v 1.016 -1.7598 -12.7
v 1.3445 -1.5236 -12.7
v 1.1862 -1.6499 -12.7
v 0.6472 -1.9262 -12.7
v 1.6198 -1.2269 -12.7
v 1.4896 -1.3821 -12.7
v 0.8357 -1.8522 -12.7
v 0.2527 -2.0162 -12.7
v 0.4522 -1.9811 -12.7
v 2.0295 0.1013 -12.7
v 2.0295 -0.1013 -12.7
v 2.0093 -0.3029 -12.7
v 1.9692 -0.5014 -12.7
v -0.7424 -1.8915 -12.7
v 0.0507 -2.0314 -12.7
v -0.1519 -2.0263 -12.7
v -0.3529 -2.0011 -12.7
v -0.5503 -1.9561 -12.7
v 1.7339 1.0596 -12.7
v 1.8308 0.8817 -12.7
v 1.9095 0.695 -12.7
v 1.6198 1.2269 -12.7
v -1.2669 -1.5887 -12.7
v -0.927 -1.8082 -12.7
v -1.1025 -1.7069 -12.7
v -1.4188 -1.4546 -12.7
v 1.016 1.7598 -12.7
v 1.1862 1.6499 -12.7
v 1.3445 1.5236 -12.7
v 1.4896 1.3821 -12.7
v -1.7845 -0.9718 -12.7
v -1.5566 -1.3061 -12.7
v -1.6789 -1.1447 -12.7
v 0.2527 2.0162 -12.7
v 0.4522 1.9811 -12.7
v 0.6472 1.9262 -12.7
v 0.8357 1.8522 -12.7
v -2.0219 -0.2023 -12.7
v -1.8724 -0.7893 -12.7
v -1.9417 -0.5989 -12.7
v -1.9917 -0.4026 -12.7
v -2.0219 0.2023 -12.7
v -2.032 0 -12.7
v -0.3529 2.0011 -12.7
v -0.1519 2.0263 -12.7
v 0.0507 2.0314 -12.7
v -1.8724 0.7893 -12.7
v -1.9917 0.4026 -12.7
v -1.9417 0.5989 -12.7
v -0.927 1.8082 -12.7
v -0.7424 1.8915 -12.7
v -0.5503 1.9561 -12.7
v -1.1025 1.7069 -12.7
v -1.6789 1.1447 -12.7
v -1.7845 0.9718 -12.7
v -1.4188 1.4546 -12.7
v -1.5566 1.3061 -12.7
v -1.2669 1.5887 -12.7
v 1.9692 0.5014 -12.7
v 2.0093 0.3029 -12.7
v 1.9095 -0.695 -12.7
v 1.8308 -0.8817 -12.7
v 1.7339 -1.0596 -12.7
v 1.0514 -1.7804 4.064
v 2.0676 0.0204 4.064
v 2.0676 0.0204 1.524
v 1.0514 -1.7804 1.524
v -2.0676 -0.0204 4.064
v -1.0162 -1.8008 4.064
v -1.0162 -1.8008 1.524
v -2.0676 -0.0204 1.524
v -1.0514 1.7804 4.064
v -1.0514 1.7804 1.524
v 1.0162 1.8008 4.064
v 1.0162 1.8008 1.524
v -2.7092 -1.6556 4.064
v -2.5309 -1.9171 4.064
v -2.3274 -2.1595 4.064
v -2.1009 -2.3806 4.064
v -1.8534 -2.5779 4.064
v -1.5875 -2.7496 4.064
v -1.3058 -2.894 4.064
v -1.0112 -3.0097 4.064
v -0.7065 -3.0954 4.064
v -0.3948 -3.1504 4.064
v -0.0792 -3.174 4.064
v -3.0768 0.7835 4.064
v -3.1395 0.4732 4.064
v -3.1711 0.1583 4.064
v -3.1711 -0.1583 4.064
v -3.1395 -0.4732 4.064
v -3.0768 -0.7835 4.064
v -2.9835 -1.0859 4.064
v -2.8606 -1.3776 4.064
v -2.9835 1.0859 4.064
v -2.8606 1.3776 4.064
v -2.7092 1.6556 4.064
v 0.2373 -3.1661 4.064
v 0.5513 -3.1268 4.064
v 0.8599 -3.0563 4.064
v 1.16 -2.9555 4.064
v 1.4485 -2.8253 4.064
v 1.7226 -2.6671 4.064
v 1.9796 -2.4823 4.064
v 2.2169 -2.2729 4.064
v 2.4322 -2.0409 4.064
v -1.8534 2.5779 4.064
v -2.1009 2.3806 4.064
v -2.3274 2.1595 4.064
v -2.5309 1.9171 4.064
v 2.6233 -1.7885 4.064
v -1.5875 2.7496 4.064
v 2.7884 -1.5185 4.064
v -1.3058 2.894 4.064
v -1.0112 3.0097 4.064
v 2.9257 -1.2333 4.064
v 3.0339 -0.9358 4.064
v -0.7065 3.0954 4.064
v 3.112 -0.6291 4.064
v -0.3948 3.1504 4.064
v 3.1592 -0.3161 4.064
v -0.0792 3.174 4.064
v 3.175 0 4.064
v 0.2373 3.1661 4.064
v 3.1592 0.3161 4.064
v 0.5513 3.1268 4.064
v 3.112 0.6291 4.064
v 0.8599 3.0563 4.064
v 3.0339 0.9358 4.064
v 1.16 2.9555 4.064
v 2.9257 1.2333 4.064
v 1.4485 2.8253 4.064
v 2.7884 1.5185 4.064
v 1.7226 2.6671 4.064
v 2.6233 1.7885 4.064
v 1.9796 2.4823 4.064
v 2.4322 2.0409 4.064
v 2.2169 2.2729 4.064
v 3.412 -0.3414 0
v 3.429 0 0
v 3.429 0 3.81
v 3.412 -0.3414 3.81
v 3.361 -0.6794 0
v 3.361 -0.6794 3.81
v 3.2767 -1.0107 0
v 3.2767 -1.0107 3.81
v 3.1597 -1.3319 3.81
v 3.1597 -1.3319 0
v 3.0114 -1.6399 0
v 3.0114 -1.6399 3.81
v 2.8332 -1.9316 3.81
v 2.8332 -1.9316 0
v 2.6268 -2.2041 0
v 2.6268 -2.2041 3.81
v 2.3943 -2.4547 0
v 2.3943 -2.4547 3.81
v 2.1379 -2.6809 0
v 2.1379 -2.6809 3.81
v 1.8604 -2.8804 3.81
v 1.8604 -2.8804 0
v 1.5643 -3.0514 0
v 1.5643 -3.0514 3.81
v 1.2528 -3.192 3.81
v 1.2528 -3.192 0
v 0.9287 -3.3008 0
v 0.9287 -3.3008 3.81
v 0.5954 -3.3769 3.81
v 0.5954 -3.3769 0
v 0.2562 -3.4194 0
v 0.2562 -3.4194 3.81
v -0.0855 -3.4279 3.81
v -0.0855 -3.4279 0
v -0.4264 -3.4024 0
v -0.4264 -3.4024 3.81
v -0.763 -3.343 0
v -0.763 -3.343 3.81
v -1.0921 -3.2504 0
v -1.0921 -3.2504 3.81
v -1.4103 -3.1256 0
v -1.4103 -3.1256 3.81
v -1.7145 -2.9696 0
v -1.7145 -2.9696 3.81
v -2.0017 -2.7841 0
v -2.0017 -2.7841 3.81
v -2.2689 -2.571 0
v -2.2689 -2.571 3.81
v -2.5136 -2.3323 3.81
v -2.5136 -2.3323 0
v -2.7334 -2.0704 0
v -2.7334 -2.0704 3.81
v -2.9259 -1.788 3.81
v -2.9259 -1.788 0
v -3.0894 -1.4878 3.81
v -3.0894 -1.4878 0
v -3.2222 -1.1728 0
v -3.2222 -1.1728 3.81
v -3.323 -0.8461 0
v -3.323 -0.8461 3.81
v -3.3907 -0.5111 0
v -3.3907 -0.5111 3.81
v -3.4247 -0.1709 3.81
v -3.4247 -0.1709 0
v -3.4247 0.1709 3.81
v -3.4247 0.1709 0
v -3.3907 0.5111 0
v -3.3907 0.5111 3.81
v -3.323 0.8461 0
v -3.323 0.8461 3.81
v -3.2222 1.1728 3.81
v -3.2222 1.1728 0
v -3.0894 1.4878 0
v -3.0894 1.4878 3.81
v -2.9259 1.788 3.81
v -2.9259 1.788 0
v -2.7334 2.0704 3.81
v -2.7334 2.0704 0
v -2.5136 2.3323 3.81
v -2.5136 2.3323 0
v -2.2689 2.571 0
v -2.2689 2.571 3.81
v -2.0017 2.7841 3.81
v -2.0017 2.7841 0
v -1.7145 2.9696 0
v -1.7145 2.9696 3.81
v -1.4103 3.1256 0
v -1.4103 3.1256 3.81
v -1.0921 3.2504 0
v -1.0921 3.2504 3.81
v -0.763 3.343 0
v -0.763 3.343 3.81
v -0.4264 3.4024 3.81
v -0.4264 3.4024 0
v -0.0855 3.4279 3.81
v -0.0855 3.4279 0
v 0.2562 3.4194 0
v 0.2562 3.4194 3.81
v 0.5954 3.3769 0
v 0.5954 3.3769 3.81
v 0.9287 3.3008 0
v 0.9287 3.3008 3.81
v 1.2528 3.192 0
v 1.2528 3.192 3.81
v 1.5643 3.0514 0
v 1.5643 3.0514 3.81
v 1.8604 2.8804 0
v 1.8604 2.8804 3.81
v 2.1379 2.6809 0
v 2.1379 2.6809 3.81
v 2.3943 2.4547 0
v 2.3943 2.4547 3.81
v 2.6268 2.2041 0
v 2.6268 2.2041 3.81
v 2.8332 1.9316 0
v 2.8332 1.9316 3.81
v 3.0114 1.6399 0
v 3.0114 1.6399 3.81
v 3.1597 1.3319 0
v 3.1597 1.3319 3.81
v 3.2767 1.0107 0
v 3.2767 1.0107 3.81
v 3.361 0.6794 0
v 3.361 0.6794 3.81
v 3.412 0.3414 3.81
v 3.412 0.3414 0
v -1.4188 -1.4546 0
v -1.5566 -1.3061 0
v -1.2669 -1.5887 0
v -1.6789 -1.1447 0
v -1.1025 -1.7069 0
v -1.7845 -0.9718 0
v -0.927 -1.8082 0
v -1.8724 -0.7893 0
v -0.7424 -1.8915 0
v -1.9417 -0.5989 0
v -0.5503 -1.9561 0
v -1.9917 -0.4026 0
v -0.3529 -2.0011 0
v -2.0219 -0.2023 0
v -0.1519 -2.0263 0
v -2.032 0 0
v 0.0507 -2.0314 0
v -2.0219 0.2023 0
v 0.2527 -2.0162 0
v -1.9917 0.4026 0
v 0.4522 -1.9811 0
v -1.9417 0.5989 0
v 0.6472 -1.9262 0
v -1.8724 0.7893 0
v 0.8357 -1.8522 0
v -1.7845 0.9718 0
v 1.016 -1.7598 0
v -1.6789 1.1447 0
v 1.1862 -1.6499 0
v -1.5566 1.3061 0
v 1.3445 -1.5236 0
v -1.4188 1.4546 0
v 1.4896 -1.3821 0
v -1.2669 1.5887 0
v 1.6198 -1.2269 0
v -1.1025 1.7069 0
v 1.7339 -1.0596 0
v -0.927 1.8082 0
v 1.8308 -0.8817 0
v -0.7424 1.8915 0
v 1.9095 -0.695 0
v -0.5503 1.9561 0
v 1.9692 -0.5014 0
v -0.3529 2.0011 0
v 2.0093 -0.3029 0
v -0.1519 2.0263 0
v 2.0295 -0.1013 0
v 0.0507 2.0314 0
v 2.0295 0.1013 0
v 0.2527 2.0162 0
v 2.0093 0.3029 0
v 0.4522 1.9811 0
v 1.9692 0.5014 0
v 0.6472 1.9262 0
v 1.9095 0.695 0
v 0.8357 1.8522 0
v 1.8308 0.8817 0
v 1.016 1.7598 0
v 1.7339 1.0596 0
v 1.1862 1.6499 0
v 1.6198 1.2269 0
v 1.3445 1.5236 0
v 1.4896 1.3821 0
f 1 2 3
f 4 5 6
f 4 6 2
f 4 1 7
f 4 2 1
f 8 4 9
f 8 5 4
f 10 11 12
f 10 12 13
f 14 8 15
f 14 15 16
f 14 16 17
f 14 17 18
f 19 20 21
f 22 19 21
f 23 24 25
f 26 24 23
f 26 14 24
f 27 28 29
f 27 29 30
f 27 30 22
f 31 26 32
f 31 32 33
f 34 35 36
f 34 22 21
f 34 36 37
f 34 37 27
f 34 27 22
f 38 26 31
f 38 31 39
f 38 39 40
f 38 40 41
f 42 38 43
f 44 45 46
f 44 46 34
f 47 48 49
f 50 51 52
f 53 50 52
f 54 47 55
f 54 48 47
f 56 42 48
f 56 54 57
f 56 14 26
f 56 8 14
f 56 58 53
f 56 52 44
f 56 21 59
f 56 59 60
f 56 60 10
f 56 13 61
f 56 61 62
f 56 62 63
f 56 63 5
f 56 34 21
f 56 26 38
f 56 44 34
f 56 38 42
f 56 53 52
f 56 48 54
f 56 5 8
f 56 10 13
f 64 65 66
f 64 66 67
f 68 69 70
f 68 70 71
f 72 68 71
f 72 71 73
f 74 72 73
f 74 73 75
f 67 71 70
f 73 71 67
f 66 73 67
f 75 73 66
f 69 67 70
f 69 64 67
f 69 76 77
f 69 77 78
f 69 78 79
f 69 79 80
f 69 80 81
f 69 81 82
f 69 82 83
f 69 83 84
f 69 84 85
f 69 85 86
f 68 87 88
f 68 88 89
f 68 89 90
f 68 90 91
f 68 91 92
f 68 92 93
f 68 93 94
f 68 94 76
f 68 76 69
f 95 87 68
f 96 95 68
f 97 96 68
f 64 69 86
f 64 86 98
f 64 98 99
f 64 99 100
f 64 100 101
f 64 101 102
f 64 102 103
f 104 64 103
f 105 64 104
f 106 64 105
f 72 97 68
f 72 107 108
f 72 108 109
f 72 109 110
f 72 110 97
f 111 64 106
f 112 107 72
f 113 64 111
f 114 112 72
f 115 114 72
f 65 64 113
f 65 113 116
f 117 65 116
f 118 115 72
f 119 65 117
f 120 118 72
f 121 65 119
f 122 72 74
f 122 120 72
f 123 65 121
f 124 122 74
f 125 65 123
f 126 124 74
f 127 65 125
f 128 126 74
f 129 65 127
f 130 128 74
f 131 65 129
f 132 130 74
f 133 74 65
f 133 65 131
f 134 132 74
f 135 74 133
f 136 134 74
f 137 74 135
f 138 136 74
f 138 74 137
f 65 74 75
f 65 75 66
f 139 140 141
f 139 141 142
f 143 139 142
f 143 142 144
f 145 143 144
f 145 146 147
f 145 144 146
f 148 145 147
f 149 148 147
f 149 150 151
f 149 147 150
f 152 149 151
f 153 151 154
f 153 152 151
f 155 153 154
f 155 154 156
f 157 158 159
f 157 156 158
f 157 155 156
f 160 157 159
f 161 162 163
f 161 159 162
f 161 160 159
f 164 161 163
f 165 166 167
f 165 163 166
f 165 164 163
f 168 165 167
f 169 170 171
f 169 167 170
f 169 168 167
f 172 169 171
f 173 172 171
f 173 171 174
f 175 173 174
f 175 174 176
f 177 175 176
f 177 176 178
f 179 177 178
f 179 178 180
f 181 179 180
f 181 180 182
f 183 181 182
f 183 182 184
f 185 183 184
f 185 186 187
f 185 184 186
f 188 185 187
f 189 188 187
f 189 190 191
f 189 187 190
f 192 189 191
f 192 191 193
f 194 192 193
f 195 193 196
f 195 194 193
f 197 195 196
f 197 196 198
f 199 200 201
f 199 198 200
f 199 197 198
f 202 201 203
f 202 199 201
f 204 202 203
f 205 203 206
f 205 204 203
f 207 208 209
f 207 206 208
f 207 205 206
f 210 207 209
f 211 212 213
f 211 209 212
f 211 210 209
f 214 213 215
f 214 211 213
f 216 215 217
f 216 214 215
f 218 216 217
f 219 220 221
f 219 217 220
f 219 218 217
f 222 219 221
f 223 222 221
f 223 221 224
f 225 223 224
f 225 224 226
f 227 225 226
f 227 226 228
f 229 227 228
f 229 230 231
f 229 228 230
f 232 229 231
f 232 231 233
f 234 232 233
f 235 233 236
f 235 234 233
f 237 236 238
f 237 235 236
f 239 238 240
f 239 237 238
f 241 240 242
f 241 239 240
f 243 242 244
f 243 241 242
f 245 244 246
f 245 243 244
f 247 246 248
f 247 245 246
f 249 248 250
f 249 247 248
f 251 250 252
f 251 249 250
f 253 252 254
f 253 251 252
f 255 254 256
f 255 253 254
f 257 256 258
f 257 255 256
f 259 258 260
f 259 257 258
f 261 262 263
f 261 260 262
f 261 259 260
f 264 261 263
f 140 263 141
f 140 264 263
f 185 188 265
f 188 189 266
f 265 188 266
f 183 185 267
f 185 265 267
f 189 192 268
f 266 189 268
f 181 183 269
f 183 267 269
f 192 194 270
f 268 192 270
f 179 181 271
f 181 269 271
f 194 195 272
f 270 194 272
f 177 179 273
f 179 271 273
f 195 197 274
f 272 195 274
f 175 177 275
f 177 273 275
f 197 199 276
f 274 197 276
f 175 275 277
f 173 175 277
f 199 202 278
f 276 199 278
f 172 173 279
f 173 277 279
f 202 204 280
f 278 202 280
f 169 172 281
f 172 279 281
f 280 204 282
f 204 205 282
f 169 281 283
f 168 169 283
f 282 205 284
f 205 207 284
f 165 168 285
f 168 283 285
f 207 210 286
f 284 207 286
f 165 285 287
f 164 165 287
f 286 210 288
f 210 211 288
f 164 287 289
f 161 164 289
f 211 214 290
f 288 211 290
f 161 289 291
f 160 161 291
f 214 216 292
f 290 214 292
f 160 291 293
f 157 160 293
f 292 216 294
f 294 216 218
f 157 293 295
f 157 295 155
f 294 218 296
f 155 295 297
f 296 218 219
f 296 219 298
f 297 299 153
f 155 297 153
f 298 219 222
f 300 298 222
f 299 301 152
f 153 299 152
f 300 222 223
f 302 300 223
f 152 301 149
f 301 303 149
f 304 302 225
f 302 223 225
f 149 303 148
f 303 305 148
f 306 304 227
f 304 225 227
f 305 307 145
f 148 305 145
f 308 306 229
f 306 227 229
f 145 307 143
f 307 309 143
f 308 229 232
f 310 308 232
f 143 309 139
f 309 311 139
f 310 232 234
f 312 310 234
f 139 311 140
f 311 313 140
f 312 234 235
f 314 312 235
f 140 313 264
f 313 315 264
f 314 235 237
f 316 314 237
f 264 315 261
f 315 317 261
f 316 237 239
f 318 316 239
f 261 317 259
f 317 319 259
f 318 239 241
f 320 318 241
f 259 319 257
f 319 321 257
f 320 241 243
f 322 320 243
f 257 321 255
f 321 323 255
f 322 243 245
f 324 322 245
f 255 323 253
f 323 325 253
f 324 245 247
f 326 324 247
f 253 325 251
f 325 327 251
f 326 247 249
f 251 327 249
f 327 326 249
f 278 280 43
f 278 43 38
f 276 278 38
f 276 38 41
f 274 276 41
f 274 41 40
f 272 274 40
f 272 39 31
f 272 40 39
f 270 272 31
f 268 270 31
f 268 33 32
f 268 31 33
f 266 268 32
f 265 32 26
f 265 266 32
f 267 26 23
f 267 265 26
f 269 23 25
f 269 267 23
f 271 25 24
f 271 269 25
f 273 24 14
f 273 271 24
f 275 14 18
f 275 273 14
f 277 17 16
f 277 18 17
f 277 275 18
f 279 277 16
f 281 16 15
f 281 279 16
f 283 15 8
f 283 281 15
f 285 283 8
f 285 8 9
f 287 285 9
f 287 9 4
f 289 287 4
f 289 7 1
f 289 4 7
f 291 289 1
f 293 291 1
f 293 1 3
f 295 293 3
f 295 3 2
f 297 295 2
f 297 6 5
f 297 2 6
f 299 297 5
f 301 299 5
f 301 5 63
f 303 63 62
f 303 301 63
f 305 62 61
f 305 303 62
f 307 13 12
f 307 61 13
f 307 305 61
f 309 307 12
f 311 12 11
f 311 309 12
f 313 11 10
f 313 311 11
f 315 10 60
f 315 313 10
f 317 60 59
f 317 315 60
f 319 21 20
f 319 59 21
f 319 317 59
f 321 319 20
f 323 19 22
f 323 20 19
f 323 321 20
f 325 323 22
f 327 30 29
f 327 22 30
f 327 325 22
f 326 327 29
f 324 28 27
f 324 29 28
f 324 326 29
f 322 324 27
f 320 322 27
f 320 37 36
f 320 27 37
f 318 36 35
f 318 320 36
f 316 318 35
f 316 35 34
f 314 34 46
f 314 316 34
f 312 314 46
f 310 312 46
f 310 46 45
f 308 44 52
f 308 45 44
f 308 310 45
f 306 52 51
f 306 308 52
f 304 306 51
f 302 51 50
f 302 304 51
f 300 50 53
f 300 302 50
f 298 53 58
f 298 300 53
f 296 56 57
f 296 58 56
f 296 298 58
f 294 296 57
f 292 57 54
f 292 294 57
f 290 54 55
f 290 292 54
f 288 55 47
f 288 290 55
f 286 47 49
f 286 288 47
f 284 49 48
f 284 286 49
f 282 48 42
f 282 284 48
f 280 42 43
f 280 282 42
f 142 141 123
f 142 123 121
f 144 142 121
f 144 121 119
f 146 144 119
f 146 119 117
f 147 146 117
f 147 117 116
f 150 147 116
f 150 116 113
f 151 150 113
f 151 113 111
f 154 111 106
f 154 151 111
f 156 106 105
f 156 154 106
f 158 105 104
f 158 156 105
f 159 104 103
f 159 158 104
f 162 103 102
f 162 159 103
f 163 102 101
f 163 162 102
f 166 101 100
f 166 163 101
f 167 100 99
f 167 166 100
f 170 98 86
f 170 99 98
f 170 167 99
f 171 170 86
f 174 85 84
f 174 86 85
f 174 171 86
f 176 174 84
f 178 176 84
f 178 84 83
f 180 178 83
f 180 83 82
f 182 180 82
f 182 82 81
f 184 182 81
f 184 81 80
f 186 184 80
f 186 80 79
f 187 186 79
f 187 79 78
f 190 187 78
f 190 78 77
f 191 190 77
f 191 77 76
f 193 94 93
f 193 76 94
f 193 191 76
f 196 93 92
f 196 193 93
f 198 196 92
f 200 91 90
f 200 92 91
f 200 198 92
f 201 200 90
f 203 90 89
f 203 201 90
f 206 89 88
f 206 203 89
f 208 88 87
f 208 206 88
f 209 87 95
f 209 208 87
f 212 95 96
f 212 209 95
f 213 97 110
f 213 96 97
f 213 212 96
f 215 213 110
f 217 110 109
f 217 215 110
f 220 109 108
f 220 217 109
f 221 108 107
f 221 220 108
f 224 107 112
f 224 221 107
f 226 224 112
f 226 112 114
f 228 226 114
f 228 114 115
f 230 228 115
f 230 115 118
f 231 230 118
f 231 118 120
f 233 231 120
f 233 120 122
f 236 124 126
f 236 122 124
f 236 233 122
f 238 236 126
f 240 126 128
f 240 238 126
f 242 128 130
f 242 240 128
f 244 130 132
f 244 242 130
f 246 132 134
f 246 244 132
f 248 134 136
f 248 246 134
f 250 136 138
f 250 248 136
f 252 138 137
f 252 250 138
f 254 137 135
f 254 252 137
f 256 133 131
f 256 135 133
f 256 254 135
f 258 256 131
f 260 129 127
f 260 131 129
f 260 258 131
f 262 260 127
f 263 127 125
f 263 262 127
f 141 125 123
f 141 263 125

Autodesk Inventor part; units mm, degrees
ref_plane "YZ Plane" through (0, 0, 0) normal (1, 0, 0) x (0, 1, 0)
ref_plane "XZ Plane" through (0, 0, 0) normal (0, 1, 0) x (-1, 0, 0)
ref_plane "XY Plane" through (0, 0, 0) normal (0, 0, 1) x (1, 0, 0)
sketch "Sketch1" plane through (0, 0, 0) normal (0, 0, 1) x (1, 0, 0)
  circle A0 centre (0, 0) radius 3.429
  dimension "d0" = 6.858
extrude "Extrusion1" add sketch "Sketch1" along normal blind 4.064
sketch "Sketch2" plane through (0, 0, 4.064) normal (0, 0, 1) x (1, 0, 0)
  line L0 (-1.0514, 1.7804) -> (1.0162, 1.8008)
  line L1 (1.0162, 1.8008) -> (2.0676, 0.0204)
  line L2 (2.0676, 0.0204) -> (1.0514, -1.7804)
  line L3 (1.0514, -1.7804) -> (-1.0162, -1.8008)
  line L4 (-1.0162, -1.8008) -> (-2.0676, -0.0204)
  line L5 (-2.0676, -0.0204) -> (-1.0514, 1.7804)
  point P0 (0, 0)
  point P1 (0, 0)
  dimension "d3" = 3.5814
extrude "Extrusion2" cut sketch "Sketch2" against normal blind 2.54
chamfer "Chamfer1" distance 0.254 angle 45 1 edges at (-3.429, 0, 4.064)
sketch "Sketch3" plane through (0, 0, 0) normal (0, 0, -1) x (-1, 0, 0)
  circle A0 centre (0, 0) radius 2.032
  dimension "d9" = 4.064
extrude "Extrusion3" add sketch "Sketch3" along normal blind 12.7
thread "Thread1" size "8-32 UNC" class "2A" standard "ANSI Unified Screw Threads" full length
properties part number "8-32 UNC Bolt" material "Stainless Steel"
